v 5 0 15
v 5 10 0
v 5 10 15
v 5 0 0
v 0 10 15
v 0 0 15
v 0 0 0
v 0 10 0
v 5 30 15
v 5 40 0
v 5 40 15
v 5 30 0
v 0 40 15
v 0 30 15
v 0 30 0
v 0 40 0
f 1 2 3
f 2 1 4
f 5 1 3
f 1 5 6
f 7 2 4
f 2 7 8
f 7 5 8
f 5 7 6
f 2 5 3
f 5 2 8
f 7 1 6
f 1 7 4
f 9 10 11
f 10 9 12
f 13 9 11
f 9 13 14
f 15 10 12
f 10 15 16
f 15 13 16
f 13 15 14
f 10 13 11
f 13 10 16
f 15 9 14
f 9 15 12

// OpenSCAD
cube( [5, 10, 15]);
translate([0, 30, 0])
cube( [5, 10, 15]);
